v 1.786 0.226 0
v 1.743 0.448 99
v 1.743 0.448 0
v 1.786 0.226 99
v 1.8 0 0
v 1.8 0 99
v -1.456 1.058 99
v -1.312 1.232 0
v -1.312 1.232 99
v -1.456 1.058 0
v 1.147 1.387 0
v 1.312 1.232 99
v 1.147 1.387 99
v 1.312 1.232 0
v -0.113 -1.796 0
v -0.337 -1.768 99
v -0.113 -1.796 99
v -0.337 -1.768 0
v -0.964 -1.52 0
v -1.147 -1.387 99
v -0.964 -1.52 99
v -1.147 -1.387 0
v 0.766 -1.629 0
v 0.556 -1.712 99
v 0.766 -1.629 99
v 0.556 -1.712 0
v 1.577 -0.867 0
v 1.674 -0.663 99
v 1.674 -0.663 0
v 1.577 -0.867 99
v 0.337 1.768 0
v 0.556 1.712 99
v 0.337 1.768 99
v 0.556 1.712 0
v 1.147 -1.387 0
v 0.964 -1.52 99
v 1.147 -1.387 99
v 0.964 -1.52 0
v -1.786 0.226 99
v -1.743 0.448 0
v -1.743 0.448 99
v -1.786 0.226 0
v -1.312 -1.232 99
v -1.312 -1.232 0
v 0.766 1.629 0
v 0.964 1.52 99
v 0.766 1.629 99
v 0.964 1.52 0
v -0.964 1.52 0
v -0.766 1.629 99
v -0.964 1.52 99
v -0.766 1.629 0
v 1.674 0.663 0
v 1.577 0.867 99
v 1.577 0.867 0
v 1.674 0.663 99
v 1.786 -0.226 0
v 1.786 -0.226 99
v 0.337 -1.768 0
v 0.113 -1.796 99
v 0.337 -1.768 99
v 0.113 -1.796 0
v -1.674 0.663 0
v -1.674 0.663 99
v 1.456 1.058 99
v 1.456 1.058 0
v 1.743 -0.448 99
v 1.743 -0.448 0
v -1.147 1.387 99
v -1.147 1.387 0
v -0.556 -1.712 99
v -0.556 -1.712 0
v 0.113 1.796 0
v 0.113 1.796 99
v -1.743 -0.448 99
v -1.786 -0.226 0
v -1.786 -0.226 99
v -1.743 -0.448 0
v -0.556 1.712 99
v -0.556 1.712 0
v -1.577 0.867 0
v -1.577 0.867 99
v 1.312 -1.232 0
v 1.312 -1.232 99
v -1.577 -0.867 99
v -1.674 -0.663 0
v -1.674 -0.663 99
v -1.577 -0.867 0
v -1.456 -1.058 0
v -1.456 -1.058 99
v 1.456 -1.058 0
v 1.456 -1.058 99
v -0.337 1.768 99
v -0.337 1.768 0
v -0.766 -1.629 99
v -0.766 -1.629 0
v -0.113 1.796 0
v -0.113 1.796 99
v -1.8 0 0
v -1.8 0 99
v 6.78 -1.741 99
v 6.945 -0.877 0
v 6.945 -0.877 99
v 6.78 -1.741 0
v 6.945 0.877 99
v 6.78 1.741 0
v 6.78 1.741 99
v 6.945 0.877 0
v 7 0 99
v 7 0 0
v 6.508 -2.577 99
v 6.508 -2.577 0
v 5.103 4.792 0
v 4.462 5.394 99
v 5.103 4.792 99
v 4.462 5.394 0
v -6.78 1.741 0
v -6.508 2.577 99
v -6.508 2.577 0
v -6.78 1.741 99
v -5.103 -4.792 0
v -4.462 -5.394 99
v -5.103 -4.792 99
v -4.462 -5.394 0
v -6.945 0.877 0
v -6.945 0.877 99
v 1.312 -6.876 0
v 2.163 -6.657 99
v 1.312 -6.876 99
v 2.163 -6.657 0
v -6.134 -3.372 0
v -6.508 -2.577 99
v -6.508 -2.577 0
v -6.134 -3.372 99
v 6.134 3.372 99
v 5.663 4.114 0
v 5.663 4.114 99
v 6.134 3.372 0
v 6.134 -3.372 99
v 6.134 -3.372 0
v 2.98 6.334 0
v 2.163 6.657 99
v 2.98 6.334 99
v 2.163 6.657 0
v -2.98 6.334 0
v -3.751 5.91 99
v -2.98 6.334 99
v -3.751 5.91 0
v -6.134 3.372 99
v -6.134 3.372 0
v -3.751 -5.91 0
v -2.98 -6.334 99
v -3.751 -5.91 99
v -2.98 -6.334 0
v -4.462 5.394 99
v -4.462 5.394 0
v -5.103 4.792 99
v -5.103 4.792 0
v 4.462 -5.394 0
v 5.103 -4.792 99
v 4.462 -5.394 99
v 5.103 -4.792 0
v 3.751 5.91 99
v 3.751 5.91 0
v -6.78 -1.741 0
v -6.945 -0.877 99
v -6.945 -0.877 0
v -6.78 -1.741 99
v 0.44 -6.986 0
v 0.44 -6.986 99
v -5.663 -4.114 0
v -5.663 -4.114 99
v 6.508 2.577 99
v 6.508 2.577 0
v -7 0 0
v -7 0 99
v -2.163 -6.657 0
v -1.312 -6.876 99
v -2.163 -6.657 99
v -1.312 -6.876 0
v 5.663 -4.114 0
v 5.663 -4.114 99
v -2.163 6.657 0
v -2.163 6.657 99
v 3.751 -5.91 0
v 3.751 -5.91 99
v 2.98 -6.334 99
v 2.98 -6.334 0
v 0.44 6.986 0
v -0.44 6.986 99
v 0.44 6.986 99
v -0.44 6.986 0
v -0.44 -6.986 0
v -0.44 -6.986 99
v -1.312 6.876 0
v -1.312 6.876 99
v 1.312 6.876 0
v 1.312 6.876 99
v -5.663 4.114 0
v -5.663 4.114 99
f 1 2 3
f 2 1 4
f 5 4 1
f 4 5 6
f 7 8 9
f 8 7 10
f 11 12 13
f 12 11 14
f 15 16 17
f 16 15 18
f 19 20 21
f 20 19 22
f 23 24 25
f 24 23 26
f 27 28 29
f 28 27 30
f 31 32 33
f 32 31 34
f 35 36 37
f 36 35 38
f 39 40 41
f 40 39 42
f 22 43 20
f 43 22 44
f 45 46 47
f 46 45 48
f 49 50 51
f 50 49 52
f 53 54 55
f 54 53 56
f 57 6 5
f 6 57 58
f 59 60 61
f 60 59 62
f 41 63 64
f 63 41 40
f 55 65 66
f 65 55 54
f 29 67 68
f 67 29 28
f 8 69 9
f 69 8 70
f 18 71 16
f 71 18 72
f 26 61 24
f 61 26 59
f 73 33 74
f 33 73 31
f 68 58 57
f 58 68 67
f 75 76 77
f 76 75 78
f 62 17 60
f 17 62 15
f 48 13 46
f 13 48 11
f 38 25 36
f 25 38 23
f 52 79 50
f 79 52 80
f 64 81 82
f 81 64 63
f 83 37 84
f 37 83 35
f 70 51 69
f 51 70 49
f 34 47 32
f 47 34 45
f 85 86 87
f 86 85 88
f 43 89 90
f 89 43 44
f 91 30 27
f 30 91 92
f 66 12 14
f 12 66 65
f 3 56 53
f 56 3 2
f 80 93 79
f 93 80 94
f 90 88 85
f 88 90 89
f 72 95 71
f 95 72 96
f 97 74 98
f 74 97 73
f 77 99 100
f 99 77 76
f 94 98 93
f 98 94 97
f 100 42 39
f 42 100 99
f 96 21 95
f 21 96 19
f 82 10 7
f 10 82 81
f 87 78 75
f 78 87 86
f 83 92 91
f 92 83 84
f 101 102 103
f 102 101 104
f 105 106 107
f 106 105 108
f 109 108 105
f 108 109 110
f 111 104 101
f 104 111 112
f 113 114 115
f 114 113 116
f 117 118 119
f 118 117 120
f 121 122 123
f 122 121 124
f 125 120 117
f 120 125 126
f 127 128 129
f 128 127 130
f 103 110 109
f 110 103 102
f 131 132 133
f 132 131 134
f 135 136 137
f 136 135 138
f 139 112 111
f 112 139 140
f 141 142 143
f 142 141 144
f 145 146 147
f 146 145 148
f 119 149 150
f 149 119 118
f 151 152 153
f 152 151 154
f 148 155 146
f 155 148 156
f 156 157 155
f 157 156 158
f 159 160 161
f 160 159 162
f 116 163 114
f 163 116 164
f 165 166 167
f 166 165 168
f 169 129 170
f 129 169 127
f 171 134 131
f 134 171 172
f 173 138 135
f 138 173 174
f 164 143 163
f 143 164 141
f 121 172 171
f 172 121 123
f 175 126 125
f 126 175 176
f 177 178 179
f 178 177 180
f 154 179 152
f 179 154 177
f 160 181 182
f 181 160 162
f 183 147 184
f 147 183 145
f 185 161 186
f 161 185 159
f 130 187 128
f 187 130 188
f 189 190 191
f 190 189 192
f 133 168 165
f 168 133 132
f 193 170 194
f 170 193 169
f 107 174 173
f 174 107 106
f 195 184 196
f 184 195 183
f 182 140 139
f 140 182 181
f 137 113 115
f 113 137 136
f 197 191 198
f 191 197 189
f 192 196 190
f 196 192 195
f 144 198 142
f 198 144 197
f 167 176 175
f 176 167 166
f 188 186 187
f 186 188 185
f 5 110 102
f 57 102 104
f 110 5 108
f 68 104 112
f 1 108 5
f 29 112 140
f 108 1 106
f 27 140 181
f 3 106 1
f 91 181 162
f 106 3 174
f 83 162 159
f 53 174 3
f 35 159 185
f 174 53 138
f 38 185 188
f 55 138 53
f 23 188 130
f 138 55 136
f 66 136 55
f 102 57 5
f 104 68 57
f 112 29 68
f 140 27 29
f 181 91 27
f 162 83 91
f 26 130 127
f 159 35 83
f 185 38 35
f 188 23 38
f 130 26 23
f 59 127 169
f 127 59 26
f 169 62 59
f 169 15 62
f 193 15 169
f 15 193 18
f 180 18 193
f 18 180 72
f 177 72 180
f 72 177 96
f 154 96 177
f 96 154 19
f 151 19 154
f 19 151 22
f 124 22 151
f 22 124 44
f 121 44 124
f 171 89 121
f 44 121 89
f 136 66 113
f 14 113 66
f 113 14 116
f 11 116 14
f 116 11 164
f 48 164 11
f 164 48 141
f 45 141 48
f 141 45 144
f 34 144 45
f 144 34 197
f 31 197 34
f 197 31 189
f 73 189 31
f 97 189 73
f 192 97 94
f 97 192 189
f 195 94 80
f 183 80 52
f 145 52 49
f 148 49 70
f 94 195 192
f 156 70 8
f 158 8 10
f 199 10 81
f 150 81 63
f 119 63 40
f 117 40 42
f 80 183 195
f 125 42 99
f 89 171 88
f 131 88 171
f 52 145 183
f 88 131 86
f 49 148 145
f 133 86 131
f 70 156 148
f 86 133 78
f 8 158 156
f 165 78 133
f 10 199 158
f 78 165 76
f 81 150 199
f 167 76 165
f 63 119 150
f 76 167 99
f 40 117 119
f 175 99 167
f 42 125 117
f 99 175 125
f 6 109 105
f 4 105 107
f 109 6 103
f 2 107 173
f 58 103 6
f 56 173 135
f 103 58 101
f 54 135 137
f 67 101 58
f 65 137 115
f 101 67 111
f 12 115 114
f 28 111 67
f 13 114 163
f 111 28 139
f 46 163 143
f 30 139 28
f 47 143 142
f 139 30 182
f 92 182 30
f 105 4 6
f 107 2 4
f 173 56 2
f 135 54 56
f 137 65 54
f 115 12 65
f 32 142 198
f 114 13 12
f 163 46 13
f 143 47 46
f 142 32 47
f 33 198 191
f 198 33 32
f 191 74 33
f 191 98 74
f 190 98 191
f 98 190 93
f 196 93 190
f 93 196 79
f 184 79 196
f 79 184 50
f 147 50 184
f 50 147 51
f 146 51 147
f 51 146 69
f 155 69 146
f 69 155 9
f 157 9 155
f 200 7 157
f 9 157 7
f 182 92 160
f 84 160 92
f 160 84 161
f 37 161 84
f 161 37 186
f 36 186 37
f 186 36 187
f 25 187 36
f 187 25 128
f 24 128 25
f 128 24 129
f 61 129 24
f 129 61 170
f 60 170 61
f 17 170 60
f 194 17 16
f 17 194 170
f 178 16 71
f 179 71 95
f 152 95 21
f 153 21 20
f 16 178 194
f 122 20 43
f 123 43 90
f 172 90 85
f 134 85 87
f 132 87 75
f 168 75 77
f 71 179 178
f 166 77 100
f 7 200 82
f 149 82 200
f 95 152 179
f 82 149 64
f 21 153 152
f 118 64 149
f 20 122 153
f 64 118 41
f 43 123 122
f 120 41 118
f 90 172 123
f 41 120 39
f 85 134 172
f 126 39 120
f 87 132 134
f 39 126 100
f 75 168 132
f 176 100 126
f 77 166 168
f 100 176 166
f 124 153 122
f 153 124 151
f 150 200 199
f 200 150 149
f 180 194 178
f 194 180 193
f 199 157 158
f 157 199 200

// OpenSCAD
$fn = 50;


difference() {
	union() {
		cylinder(h = 99, r = 7.0000000000);
	}
	union() {
		translate(v = [0.0000000000, 0.0000000000, -100.0000000000]) {
			cylinder(h = 200, r = 1.8000000000);
		}
		cylinder(h = 99, r = 1.8000000000);
		cylinder(h = 99, r = 1.8000000000);
		cylinder(h = 99, r = 1.8000000000);
	}
}
